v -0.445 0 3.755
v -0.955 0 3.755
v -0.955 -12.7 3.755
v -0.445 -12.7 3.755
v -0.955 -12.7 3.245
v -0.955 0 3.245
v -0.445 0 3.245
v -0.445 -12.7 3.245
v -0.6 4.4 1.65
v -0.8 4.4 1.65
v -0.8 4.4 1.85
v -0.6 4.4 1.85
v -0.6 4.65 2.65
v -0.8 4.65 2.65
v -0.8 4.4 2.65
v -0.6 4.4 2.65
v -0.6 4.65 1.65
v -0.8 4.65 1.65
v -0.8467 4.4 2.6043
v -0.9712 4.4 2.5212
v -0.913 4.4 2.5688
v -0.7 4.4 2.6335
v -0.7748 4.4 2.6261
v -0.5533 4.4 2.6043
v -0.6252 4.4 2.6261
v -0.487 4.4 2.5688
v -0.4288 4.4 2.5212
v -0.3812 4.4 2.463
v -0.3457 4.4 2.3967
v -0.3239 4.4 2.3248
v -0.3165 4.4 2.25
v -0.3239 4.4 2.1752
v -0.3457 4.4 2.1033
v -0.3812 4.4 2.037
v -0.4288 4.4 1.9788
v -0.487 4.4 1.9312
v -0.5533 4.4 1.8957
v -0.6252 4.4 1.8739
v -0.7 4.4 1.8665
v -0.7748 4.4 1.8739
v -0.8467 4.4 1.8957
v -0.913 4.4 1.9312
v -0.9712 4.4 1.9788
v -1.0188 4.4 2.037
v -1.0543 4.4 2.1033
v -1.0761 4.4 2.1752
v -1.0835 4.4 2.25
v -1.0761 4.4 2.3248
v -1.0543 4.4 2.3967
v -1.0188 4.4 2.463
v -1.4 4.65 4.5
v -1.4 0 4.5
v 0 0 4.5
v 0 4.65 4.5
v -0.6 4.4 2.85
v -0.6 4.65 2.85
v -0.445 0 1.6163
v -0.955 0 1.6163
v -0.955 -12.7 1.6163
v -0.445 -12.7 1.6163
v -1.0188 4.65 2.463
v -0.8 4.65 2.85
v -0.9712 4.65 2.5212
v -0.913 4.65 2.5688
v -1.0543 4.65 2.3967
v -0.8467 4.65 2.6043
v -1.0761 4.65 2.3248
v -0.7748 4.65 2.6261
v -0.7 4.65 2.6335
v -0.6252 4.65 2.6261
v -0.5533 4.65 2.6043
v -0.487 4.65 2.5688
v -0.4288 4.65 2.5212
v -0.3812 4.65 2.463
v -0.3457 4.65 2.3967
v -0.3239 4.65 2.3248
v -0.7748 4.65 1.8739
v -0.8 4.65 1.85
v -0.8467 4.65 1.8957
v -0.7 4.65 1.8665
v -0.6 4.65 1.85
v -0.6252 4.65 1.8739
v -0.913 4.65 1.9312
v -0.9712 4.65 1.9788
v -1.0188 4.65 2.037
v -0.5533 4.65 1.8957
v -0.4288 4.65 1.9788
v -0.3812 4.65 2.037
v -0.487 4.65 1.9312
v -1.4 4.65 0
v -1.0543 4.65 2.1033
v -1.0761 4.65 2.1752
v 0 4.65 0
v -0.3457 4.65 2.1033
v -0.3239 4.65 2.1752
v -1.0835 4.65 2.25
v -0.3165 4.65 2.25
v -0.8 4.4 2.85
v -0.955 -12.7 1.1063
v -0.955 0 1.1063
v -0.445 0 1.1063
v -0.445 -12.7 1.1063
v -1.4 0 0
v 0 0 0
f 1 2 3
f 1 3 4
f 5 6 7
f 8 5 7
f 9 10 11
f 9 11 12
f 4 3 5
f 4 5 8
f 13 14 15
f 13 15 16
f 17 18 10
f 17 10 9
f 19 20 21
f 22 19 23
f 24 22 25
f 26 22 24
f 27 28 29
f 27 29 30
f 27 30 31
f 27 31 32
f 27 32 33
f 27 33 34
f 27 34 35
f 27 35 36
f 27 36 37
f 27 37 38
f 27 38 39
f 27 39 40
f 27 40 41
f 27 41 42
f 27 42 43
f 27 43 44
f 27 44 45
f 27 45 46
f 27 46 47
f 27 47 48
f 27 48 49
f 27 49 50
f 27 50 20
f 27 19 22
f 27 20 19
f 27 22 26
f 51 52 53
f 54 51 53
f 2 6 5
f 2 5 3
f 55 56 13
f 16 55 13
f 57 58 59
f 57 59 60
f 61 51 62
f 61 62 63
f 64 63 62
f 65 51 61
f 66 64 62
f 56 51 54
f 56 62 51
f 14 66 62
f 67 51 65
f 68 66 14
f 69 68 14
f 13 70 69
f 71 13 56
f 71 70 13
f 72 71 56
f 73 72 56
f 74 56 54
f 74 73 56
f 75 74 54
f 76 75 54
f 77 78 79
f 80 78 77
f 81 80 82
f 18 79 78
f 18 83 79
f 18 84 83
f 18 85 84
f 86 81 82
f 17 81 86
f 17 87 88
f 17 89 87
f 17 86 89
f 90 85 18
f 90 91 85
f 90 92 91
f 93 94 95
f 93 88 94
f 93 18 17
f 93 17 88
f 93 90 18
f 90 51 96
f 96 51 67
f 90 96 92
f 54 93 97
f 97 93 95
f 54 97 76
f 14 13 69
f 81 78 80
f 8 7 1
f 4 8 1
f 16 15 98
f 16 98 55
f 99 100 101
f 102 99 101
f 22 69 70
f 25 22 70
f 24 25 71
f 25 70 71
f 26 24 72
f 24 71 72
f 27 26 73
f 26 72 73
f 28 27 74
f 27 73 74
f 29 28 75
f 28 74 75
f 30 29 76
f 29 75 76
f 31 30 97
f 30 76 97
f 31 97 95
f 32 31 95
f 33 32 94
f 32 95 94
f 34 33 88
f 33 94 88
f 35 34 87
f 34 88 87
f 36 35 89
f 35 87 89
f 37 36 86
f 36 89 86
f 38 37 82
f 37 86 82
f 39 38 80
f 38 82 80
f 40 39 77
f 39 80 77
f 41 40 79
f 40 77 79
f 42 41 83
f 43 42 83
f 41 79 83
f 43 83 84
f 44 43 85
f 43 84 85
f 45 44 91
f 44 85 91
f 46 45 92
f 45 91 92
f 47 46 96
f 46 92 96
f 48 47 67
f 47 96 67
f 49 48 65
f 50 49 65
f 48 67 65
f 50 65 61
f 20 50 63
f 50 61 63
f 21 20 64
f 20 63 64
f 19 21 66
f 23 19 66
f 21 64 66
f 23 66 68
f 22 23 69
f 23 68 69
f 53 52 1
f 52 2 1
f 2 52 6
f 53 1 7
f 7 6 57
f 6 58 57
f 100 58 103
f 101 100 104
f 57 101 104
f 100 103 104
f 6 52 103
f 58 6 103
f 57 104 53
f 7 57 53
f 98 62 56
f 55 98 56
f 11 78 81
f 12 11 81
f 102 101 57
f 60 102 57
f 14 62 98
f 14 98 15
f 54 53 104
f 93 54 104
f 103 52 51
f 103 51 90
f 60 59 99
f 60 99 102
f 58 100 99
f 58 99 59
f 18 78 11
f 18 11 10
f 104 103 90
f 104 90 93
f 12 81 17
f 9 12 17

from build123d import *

# Parameters (mm, degrees)
CROQUIS1_W              = 1.4
CROQUIS1_H              = 4.5
SALIENTE_EXTRUIR1_DEPTH = 4.65
CROQUIS3_R              = 0.383471958
CORTAR_EXTRUIR1_DEPTH   = 0.25
CROQUIS4_W              = 0.2
CROQUIS4_H              = 0.2
CORTAR_EXTRUIR5_DEPTH   = 0.25
CROQUIS5_W              = 0.51
CROQUIS5_H              = 0.51
SALIENTE_EXTRUIR2_DEPTH = 12.7


with BuildPart() as part:
    # Croquis1 → Saliente-Extruir1 (new body)
    with BuildSketch(Plane(origin=(0, 0, 0), x_dir=(1, 0, 0), z_dir=(0, 1, 0))):
        with Locations((-0.7, -2.25)):
            Rectangle(CROQUIS1_W, CROQUIS1_H)
    extrude(amount=SALIENTE_EXTRUIR1_DEPTH)

    # Croquis3 → Cortar-Extruir1 (cut)
    with BuildSketch(Plane(origin=(0, 4.65, 0), x_dir=(1, 0, 0), z_dir=(0, 1, 0))):
        with Locations(Location((-0.7, -2.25, 0), (0, 0, 270))):
            Circle(CROQUIS3_R)
    extrude(amount=-CORTAR_EXTRUIR1_DEPTH, mode=Mode.SUBTRACT)

    # Croquis4 → Cortar-Extruir5 (cut)
    with BuildSketch(Plane(origin=(0, 4.65, 0), x_dir=(1, 0, 0), z_dir=(0, 1, 0))):
        with Locations((-0.7, -1.75)):
            Rectangle(CROQUIS4_W, CROQUIS4_H)
        with Locations((-0.7, -2.75)):
            Rectangle(CROQUIS4_W, CROQUIS4_H)
    extrude(amount=-CORTAR_EXTRUIR5_DEPTH, mode=Mode.SUBTRACT)

    # Croquis5 → Saliente-Extruir2 (add)
    with BuildSketch(Plane.XZ):
        with Locations((-0.7, 3.5)):
            Rectangle(CROQUIS5_W, CROQUIS5_H)
        with Locations((-0.7, 1.361338898)):
            Rectangle(CROQUIS5_W, CROQUIS5_H)
    extrude(amount=SALIENTE_EXTRUIR2_DEPTH)


solid = part.part
